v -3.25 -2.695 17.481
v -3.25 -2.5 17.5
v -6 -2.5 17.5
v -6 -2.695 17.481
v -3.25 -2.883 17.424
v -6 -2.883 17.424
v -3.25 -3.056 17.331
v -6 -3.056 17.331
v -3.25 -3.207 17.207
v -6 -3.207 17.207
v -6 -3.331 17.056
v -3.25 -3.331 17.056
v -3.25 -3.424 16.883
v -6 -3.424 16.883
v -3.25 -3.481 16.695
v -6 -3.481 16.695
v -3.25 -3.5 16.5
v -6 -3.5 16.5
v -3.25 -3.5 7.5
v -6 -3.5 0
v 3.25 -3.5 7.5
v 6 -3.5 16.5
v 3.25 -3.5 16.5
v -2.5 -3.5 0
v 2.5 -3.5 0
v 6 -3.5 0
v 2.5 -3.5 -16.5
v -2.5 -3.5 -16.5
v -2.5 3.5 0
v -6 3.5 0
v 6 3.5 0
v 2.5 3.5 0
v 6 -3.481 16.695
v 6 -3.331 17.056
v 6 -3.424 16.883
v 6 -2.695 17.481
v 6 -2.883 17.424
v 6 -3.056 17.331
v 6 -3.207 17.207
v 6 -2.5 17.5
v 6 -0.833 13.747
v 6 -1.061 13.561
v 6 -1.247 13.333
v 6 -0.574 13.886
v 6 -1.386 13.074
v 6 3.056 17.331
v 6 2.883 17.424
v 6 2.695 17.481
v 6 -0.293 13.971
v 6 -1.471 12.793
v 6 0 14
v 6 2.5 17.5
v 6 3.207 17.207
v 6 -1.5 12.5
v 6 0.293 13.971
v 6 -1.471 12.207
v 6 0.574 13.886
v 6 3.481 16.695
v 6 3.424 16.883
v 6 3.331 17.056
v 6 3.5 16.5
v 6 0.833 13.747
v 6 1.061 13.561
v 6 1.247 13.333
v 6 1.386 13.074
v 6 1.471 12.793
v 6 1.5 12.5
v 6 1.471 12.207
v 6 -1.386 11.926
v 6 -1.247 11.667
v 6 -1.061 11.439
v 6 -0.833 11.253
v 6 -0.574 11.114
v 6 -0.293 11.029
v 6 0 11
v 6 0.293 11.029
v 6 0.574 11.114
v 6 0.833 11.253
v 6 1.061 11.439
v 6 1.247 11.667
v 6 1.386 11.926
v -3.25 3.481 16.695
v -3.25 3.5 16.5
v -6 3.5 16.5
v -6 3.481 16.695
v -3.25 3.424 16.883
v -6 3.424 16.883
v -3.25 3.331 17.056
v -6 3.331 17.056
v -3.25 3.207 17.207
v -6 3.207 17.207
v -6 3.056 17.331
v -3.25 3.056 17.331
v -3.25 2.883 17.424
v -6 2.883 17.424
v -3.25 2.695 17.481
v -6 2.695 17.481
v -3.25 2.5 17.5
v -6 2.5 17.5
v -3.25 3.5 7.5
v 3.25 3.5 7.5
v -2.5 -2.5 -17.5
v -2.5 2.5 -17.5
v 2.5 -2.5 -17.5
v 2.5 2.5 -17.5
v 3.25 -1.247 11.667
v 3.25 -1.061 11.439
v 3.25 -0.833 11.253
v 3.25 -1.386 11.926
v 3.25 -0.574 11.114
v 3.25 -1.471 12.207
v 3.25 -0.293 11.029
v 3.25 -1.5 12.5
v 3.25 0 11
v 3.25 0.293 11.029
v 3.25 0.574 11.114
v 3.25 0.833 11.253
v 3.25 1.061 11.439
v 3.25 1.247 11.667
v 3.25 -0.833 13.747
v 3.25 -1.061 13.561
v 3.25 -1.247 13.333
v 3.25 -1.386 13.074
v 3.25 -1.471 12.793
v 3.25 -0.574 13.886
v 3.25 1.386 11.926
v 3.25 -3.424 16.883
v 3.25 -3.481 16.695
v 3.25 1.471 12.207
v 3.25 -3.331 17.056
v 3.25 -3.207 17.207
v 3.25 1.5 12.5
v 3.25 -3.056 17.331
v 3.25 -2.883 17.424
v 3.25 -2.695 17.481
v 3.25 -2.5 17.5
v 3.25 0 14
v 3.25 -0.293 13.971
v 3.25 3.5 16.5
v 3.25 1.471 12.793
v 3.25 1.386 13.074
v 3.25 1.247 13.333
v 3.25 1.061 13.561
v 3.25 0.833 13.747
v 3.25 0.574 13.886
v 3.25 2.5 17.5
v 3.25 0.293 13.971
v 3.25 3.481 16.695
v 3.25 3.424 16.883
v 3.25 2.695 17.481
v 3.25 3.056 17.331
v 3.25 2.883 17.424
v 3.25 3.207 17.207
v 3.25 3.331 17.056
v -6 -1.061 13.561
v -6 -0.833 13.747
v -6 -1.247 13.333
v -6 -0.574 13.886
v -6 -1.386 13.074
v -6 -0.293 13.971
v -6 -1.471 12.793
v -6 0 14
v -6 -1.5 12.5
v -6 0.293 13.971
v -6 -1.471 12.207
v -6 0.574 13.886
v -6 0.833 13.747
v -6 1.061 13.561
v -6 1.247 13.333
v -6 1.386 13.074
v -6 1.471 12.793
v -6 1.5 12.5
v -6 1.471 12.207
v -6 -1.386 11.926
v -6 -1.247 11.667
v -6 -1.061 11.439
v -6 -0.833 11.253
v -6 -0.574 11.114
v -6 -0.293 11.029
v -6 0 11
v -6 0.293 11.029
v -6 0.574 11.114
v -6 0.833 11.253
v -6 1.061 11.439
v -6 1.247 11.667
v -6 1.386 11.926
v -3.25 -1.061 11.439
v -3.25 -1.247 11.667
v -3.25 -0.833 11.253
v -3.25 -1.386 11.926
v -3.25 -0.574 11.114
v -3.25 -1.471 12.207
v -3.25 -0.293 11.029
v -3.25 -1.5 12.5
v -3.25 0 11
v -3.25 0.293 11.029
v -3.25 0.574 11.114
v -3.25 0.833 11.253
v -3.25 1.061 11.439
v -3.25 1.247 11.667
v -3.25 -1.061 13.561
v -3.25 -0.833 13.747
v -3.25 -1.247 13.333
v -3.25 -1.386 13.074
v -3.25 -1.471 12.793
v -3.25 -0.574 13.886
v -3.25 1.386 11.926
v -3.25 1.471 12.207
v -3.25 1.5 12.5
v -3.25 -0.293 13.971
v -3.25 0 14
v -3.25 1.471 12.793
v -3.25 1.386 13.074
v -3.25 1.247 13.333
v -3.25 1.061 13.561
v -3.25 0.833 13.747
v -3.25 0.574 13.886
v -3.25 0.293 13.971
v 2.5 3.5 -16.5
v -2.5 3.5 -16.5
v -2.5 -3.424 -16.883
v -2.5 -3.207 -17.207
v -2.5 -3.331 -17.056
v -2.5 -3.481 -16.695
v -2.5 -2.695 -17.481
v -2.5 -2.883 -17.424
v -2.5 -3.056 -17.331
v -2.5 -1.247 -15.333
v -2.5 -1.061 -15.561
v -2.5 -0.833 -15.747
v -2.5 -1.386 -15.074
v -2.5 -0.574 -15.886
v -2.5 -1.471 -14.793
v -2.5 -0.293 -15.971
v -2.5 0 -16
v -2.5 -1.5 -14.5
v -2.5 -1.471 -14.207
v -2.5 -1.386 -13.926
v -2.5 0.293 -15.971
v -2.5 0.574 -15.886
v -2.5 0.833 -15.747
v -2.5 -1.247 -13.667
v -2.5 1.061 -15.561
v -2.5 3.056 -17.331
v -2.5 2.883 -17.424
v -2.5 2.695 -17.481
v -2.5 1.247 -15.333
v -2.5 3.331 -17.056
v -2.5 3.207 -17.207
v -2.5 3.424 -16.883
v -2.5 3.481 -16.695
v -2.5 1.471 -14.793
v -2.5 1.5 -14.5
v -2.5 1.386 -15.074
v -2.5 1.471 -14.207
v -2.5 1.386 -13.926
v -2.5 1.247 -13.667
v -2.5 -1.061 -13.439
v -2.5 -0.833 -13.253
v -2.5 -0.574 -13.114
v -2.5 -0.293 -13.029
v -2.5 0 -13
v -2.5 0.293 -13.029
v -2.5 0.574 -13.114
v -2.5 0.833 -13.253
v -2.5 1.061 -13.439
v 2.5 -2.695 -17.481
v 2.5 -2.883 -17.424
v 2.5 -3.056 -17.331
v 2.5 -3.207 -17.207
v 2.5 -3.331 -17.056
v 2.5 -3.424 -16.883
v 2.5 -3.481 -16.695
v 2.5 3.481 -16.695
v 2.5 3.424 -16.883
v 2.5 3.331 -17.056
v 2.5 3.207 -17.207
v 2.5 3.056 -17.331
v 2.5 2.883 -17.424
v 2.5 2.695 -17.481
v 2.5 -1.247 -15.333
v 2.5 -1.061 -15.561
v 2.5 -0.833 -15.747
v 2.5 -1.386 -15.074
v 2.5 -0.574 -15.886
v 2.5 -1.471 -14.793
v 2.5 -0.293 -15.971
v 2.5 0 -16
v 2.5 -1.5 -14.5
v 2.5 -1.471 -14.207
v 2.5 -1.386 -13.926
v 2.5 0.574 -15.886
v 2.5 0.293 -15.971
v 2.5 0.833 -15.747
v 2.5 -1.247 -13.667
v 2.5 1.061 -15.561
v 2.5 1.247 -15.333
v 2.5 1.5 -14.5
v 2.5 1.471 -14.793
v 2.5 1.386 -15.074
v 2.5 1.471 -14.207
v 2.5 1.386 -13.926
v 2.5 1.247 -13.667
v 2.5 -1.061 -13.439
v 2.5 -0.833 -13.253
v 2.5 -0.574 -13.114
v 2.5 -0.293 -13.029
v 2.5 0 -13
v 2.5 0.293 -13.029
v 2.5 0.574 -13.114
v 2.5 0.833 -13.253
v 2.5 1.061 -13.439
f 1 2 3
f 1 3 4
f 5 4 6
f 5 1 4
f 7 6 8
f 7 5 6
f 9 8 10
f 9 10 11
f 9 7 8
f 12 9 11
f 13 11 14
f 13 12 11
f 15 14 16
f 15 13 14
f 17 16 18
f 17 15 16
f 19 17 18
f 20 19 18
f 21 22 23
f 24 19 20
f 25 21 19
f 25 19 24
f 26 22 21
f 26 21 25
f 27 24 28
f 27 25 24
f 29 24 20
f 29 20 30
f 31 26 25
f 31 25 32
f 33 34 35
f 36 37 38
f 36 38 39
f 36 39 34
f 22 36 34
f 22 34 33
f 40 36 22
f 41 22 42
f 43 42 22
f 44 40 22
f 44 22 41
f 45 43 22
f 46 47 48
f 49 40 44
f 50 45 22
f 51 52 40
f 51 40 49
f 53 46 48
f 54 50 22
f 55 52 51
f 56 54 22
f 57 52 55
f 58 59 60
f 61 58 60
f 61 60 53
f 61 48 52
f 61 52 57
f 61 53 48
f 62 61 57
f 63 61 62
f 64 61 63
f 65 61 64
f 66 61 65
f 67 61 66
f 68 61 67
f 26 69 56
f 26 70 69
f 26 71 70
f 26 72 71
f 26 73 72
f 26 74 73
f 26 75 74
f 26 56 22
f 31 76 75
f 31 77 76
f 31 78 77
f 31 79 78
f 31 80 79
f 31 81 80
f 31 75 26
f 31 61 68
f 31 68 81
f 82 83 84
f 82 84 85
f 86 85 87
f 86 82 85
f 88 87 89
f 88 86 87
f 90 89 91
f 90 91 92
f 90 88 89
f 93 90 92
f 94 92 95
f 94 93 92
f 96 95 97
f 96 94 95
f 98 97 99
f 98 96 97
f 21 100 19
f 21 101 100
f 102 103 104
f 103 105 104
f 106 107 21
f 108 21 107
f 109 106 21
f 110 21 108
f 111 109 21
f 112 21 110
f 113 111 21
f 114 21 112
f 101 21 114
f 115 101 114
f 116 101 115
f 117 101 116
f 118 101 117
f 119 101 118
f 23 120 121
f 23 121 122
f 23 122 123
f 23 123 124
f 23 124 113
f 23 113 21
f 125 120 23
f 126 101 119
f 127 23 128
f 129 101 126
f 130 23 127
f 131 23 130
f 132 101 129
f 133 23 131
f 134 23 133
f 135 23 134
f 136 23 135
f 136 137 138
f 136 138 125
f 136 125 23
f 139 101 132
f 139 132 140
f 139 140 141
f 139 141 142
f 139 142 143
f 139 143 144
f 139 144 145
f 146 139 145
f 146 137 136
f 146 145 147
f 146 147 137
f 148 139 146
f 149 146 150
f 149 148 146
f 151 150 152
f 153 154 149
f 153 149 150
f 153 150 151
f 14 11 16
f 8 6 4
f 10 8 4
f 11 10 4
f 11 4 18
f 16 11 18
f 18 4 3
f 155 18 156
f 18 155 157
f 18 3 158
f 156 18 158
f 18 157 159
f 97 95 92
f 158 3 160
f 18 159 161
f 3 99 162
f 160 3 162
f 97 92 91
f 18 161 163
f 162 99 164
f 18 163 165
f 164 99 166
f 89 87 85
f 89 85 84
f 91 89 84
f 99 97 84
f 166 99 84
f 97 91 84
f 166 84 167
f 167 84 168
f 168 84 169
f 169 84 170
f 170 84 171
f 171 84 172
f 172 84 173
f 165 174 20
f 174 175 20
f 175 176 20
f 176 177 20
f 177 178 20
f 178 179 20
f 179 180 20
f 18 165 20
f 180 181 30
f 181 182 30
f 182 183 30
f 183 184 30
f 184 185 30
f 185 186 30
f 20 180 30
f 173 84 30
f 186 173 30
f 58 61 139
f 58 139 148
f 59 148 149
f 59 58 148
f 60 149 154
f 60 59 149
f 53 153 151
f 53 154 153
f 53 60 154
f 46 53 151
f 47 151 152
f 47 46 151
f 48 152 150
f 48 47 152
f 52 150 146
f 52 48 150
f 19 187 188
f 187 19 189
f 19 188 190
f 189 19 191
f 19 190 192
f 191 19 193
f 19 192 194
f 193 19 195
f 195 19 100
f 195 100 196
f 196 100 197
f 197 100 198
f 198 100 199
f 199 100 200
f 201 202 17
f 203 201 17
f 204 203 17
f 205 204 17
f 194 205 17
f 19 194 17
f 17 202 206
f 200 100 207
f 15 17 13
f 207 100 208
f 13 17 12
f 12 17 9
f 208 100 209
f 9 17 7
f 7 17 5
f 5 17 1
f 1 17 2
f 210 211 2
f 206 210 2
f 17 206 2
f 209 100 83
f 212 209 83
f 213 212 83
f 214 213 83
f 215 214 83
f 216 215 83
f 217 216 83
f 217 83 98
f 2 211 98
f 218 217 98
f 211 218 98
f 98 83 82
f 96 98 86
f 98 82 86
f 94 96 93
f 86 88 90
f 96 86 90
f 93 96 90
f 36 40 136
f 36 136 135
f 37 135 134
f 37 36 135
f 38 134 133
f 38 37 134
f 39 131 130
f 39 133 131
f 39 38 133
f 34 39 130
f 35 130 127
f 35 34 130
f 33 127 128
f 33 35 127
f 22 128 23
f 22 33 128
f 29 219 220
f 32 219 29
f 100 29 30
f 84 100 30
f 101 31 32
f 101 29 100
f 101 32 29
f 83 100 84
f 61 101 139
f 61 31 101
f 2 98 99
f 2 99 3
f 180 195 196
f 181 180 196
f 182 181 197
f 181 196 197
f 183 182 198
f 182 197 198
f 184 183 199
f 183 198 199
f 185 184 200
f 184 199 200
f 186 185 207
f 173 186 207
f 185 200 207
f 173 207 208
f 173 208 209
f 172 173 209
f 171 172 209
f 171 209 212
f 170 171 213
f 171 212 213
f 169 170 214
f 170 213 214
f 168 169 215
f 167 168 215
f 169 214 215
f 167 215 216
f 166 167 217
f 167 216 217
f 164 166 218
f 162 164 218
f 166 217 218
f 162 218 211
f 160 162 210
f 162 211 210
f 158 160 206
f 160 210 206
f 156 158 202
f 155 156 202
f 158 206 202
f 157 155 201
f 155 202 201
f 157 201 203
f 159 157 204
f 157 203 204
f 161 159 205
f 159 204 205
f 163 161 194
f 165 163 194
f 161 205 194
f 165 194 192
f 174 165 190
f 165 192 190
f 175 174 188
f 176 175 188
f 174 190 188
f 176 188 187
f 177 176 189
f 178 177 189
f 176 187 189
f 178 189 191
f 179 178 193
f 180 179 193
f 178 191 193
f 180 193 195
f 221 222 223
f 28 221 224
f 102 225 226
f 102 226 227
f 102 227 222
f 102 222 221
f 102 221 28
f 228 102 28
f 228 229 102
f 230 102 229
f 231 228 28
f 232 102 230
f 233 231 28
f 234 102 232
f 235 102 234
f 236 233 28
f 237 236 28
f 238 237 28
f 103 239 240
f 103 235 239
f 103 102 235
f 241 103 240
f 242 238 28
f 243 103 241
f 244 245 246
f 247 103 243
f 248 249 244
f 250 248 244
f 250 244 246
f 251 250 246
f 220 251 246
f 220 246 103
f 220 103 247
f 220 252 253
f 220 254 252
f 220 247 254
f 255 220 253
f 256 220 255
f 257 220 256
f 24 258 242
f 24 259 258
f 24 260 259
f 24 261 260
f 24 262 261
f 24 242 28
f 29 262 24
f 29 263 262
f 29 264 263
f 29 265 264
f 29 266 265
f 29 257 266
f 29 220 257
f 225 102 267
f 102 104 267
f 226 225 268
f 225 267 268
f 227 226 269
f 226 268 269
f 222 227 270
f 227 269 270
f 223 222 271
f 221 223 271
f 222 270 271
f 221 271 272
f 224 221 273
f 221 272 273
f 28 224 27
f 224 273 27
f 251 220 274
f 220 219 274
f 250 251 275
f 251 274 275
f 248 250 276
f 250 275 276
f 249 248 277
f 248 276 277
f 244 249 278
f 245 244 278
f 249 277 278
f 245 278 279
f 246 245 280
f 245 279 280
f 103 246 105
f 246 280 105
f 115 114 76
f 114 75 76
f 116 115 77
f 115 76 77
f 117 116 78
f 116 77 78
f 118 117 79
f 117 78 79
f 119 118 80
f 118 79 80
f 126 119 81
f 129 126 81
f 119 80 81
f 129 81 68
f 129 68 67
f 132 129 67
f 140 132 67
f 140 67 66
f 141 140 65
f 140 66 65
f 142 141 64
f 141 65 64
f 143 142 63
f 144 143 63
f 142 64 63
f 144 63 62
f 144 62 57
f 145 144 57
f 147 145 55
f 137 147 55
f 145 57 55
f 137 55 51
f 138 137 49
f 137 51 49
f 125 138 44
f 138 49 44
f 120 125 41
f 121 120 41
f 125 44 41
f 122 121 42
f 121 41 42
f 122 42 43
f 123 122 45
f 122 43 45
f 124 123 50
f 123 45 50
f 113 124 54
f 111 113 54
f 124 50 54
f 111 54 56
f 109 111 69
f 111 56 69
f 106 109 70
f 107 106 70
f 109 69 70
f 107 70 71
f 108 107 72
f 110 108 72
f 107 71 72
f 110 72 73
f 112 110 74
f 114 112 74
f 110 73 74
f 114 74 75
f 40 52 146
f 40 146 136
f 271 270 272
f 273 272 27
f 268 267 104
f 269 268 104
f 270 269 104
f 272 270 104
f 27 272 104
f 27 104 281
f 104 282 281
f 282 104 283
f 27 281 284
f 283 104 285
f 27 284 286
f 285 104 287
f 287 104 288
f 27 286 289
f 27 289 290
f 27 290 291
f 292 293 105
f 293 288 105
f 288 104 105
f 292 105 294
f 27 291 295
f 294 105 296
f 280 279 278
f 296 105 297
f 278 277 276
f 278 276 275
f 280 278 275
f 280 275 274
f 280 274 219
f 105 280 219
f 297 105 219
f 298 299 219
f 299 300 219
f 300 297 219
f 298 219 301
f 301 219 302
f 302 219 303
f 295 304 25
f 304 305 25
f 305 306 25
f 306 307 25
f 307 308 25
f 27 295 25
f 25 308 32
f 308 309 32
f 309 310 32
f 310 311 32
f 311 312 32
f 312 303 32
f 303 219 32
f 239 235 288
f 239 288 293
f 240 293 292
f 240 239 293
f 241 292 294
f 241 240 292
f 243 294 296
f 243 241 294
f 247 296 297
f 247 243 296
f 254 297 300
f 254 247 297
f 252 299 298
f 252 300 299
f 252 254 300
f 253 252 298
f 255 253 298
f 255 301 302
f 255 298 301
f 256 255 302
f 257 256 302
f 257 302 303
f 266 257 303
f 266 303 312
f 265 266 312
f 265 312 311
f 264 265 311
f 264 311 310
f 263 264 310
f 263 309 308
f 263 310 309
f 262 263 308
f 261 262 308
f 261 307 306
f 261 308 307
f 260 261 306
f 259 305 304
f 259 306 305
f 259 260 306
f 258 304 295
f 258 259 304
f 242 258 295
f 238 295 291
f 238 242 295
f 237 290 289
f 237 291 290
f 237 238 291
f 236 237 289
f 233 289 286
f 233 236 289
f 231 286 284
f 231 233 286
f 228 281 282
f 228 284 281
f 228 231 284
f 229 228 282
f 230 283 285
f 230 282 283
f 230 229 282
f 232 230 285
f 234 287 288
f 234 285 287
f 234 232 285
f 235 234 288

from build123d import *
from build123d.topology import SkipClean

# Parameters (mm, degrees)
SALIENTE_EXTRUIR1_DEPTH    = 2.5
CORTAR_EXTRUIR1_DEPTH      = 19.020821291
CORTAR_EXTRUIR1_DEPTH_BACK = 19.020821291
CROQUIS2_R                 = 1.5
CROQUIS3_R                 = 1.5
SALIENTE_EXTRUIR2_DEPTH    = 6
CORTAR_EXTRUIR2_DEPTH      = 3.25


with BuildPart() as part:
    # Croquis1 → Saliente-Extruir1 (new, symmetric)
    with BuildSketch(Plane(origin=(0, 0, 0), x_dir=(0, 0, -1), z_dir=(1, 0, 0))):
        with BuildLine():
            Line((-16.5, 3.5), (16.5, 3.5))
            ThreePointArc((16.5, 3.5), (17.207106781, 3.207106781), (17.5, 2.5))
            Line((17.5, 2.5), (17.5, -2.5))
            ThreePointArc((17.5, -2.5), (17.207106781, -3.207106781), (16.5, -3.5))
            Line((16.5, -3.5), (-16.5, -3.5))
            ThreePointArc((-16.5, -3.5), (-17.207106781, -3.207106781), (-17.5, -2.5))
            Line((-17.5, -2.5), (-17.5, 2.5))
            ThreePointArc((-17.5, 2.5), (-17.207106781, 3.207106781), (-16.5, 3.5))
        make_face()
    extrude(amount=SALIENTE_EXTRUIR1_DEPTH, both=True)

    # Croquis2 → Cortar-Extruir1 (cut, two sides: drawn at the far end of the back side and taken through both)
    with BuildSketch(Plane(origin=(0, 0, 0), x_dir=(0, 0, -1), z_dir=(1, 0, 0)).offset(-CORTAR_EXTRUIR1_DEPTH_BACK)):
        with Locations((-12.5, 0)):
            Circle(CROQUIS2_R)
        with Locations((14.5, 0)):
            Circle(CROQUIS2_R)
    extrude(amount=CORTAR_EXTRUIR1_DEPTH + CORTAR_EXTRUIR1_DEPTH_BACK, mode=Mode.SUBTRACT)

    # Croquis3 → Saliente-Extruir2 (add, symmetric)
    with SkipClean():  # the faces are left unmerged after this step: merging them gives an invalid solid
        with BuildSketch(Plane(origin=(0, 0, 0), x_dir=(0, 0, -1), z_dir=(1, 0, 0))):
            with BuildLine():
                Line((-17.5, 2.5), (-17.5, -2.5))
                ThreePointArc((-17.5, -2.5), (-17.207106781, -3.207106781), (-16.5, -3.5))
                Line((-16.5, -3.5), (0, -3.5))
                Line((0, -3.5), (0, 3.5))
                Line((0, 3.5), (-16.5, 3.5))
                ThreePointArc((-16.5, 3.5), (-17.207106781, 3.207106781), (-17.5, 2.5))
            make_face()
            with Locations((-12.5, 0)):
                Circle(CROQUIS3_R, mode=Mode.SUBTRACT)
        extrude(amount=SALIENTE_EXTRUIR2_DEPTH, both=True)
    add(part.part.scale(1), mode=Mode.REPLACE)  # the faces are merged on a copy

    # Croquis4 → Cortar-Extruir2 (cut, symmetric)
    with BuildSketch(Plane(origin=(0, 0, 0), x_dir=(0, 0, -1), z_dir=(1, 0, 0))):
        with BuildLine():
            Line((-16.5, 3.5), (-7.5, 3.5))
            Line((-7.5, 3.5), (-7.5, -3.5))
            Line((-7.5, -3.5), (-16.5, -3.5))
            ThreePointArc((-16.5, -3.5), (-17.207106781, -3.207106781), (-17.5, -2.5))
            Line((-17.5, -2.5), (-17.5, 2.5))
            ThreePointArc((-17.5, 2.5), (-17.207106781, 3.207106781), (-16.5, 3.5))
        make_face()
    extrude(amount=CORTAR_EXTRUIR2_DEPTH, both=True, mode=Mode.SUBTRACT)


solid = part.part
